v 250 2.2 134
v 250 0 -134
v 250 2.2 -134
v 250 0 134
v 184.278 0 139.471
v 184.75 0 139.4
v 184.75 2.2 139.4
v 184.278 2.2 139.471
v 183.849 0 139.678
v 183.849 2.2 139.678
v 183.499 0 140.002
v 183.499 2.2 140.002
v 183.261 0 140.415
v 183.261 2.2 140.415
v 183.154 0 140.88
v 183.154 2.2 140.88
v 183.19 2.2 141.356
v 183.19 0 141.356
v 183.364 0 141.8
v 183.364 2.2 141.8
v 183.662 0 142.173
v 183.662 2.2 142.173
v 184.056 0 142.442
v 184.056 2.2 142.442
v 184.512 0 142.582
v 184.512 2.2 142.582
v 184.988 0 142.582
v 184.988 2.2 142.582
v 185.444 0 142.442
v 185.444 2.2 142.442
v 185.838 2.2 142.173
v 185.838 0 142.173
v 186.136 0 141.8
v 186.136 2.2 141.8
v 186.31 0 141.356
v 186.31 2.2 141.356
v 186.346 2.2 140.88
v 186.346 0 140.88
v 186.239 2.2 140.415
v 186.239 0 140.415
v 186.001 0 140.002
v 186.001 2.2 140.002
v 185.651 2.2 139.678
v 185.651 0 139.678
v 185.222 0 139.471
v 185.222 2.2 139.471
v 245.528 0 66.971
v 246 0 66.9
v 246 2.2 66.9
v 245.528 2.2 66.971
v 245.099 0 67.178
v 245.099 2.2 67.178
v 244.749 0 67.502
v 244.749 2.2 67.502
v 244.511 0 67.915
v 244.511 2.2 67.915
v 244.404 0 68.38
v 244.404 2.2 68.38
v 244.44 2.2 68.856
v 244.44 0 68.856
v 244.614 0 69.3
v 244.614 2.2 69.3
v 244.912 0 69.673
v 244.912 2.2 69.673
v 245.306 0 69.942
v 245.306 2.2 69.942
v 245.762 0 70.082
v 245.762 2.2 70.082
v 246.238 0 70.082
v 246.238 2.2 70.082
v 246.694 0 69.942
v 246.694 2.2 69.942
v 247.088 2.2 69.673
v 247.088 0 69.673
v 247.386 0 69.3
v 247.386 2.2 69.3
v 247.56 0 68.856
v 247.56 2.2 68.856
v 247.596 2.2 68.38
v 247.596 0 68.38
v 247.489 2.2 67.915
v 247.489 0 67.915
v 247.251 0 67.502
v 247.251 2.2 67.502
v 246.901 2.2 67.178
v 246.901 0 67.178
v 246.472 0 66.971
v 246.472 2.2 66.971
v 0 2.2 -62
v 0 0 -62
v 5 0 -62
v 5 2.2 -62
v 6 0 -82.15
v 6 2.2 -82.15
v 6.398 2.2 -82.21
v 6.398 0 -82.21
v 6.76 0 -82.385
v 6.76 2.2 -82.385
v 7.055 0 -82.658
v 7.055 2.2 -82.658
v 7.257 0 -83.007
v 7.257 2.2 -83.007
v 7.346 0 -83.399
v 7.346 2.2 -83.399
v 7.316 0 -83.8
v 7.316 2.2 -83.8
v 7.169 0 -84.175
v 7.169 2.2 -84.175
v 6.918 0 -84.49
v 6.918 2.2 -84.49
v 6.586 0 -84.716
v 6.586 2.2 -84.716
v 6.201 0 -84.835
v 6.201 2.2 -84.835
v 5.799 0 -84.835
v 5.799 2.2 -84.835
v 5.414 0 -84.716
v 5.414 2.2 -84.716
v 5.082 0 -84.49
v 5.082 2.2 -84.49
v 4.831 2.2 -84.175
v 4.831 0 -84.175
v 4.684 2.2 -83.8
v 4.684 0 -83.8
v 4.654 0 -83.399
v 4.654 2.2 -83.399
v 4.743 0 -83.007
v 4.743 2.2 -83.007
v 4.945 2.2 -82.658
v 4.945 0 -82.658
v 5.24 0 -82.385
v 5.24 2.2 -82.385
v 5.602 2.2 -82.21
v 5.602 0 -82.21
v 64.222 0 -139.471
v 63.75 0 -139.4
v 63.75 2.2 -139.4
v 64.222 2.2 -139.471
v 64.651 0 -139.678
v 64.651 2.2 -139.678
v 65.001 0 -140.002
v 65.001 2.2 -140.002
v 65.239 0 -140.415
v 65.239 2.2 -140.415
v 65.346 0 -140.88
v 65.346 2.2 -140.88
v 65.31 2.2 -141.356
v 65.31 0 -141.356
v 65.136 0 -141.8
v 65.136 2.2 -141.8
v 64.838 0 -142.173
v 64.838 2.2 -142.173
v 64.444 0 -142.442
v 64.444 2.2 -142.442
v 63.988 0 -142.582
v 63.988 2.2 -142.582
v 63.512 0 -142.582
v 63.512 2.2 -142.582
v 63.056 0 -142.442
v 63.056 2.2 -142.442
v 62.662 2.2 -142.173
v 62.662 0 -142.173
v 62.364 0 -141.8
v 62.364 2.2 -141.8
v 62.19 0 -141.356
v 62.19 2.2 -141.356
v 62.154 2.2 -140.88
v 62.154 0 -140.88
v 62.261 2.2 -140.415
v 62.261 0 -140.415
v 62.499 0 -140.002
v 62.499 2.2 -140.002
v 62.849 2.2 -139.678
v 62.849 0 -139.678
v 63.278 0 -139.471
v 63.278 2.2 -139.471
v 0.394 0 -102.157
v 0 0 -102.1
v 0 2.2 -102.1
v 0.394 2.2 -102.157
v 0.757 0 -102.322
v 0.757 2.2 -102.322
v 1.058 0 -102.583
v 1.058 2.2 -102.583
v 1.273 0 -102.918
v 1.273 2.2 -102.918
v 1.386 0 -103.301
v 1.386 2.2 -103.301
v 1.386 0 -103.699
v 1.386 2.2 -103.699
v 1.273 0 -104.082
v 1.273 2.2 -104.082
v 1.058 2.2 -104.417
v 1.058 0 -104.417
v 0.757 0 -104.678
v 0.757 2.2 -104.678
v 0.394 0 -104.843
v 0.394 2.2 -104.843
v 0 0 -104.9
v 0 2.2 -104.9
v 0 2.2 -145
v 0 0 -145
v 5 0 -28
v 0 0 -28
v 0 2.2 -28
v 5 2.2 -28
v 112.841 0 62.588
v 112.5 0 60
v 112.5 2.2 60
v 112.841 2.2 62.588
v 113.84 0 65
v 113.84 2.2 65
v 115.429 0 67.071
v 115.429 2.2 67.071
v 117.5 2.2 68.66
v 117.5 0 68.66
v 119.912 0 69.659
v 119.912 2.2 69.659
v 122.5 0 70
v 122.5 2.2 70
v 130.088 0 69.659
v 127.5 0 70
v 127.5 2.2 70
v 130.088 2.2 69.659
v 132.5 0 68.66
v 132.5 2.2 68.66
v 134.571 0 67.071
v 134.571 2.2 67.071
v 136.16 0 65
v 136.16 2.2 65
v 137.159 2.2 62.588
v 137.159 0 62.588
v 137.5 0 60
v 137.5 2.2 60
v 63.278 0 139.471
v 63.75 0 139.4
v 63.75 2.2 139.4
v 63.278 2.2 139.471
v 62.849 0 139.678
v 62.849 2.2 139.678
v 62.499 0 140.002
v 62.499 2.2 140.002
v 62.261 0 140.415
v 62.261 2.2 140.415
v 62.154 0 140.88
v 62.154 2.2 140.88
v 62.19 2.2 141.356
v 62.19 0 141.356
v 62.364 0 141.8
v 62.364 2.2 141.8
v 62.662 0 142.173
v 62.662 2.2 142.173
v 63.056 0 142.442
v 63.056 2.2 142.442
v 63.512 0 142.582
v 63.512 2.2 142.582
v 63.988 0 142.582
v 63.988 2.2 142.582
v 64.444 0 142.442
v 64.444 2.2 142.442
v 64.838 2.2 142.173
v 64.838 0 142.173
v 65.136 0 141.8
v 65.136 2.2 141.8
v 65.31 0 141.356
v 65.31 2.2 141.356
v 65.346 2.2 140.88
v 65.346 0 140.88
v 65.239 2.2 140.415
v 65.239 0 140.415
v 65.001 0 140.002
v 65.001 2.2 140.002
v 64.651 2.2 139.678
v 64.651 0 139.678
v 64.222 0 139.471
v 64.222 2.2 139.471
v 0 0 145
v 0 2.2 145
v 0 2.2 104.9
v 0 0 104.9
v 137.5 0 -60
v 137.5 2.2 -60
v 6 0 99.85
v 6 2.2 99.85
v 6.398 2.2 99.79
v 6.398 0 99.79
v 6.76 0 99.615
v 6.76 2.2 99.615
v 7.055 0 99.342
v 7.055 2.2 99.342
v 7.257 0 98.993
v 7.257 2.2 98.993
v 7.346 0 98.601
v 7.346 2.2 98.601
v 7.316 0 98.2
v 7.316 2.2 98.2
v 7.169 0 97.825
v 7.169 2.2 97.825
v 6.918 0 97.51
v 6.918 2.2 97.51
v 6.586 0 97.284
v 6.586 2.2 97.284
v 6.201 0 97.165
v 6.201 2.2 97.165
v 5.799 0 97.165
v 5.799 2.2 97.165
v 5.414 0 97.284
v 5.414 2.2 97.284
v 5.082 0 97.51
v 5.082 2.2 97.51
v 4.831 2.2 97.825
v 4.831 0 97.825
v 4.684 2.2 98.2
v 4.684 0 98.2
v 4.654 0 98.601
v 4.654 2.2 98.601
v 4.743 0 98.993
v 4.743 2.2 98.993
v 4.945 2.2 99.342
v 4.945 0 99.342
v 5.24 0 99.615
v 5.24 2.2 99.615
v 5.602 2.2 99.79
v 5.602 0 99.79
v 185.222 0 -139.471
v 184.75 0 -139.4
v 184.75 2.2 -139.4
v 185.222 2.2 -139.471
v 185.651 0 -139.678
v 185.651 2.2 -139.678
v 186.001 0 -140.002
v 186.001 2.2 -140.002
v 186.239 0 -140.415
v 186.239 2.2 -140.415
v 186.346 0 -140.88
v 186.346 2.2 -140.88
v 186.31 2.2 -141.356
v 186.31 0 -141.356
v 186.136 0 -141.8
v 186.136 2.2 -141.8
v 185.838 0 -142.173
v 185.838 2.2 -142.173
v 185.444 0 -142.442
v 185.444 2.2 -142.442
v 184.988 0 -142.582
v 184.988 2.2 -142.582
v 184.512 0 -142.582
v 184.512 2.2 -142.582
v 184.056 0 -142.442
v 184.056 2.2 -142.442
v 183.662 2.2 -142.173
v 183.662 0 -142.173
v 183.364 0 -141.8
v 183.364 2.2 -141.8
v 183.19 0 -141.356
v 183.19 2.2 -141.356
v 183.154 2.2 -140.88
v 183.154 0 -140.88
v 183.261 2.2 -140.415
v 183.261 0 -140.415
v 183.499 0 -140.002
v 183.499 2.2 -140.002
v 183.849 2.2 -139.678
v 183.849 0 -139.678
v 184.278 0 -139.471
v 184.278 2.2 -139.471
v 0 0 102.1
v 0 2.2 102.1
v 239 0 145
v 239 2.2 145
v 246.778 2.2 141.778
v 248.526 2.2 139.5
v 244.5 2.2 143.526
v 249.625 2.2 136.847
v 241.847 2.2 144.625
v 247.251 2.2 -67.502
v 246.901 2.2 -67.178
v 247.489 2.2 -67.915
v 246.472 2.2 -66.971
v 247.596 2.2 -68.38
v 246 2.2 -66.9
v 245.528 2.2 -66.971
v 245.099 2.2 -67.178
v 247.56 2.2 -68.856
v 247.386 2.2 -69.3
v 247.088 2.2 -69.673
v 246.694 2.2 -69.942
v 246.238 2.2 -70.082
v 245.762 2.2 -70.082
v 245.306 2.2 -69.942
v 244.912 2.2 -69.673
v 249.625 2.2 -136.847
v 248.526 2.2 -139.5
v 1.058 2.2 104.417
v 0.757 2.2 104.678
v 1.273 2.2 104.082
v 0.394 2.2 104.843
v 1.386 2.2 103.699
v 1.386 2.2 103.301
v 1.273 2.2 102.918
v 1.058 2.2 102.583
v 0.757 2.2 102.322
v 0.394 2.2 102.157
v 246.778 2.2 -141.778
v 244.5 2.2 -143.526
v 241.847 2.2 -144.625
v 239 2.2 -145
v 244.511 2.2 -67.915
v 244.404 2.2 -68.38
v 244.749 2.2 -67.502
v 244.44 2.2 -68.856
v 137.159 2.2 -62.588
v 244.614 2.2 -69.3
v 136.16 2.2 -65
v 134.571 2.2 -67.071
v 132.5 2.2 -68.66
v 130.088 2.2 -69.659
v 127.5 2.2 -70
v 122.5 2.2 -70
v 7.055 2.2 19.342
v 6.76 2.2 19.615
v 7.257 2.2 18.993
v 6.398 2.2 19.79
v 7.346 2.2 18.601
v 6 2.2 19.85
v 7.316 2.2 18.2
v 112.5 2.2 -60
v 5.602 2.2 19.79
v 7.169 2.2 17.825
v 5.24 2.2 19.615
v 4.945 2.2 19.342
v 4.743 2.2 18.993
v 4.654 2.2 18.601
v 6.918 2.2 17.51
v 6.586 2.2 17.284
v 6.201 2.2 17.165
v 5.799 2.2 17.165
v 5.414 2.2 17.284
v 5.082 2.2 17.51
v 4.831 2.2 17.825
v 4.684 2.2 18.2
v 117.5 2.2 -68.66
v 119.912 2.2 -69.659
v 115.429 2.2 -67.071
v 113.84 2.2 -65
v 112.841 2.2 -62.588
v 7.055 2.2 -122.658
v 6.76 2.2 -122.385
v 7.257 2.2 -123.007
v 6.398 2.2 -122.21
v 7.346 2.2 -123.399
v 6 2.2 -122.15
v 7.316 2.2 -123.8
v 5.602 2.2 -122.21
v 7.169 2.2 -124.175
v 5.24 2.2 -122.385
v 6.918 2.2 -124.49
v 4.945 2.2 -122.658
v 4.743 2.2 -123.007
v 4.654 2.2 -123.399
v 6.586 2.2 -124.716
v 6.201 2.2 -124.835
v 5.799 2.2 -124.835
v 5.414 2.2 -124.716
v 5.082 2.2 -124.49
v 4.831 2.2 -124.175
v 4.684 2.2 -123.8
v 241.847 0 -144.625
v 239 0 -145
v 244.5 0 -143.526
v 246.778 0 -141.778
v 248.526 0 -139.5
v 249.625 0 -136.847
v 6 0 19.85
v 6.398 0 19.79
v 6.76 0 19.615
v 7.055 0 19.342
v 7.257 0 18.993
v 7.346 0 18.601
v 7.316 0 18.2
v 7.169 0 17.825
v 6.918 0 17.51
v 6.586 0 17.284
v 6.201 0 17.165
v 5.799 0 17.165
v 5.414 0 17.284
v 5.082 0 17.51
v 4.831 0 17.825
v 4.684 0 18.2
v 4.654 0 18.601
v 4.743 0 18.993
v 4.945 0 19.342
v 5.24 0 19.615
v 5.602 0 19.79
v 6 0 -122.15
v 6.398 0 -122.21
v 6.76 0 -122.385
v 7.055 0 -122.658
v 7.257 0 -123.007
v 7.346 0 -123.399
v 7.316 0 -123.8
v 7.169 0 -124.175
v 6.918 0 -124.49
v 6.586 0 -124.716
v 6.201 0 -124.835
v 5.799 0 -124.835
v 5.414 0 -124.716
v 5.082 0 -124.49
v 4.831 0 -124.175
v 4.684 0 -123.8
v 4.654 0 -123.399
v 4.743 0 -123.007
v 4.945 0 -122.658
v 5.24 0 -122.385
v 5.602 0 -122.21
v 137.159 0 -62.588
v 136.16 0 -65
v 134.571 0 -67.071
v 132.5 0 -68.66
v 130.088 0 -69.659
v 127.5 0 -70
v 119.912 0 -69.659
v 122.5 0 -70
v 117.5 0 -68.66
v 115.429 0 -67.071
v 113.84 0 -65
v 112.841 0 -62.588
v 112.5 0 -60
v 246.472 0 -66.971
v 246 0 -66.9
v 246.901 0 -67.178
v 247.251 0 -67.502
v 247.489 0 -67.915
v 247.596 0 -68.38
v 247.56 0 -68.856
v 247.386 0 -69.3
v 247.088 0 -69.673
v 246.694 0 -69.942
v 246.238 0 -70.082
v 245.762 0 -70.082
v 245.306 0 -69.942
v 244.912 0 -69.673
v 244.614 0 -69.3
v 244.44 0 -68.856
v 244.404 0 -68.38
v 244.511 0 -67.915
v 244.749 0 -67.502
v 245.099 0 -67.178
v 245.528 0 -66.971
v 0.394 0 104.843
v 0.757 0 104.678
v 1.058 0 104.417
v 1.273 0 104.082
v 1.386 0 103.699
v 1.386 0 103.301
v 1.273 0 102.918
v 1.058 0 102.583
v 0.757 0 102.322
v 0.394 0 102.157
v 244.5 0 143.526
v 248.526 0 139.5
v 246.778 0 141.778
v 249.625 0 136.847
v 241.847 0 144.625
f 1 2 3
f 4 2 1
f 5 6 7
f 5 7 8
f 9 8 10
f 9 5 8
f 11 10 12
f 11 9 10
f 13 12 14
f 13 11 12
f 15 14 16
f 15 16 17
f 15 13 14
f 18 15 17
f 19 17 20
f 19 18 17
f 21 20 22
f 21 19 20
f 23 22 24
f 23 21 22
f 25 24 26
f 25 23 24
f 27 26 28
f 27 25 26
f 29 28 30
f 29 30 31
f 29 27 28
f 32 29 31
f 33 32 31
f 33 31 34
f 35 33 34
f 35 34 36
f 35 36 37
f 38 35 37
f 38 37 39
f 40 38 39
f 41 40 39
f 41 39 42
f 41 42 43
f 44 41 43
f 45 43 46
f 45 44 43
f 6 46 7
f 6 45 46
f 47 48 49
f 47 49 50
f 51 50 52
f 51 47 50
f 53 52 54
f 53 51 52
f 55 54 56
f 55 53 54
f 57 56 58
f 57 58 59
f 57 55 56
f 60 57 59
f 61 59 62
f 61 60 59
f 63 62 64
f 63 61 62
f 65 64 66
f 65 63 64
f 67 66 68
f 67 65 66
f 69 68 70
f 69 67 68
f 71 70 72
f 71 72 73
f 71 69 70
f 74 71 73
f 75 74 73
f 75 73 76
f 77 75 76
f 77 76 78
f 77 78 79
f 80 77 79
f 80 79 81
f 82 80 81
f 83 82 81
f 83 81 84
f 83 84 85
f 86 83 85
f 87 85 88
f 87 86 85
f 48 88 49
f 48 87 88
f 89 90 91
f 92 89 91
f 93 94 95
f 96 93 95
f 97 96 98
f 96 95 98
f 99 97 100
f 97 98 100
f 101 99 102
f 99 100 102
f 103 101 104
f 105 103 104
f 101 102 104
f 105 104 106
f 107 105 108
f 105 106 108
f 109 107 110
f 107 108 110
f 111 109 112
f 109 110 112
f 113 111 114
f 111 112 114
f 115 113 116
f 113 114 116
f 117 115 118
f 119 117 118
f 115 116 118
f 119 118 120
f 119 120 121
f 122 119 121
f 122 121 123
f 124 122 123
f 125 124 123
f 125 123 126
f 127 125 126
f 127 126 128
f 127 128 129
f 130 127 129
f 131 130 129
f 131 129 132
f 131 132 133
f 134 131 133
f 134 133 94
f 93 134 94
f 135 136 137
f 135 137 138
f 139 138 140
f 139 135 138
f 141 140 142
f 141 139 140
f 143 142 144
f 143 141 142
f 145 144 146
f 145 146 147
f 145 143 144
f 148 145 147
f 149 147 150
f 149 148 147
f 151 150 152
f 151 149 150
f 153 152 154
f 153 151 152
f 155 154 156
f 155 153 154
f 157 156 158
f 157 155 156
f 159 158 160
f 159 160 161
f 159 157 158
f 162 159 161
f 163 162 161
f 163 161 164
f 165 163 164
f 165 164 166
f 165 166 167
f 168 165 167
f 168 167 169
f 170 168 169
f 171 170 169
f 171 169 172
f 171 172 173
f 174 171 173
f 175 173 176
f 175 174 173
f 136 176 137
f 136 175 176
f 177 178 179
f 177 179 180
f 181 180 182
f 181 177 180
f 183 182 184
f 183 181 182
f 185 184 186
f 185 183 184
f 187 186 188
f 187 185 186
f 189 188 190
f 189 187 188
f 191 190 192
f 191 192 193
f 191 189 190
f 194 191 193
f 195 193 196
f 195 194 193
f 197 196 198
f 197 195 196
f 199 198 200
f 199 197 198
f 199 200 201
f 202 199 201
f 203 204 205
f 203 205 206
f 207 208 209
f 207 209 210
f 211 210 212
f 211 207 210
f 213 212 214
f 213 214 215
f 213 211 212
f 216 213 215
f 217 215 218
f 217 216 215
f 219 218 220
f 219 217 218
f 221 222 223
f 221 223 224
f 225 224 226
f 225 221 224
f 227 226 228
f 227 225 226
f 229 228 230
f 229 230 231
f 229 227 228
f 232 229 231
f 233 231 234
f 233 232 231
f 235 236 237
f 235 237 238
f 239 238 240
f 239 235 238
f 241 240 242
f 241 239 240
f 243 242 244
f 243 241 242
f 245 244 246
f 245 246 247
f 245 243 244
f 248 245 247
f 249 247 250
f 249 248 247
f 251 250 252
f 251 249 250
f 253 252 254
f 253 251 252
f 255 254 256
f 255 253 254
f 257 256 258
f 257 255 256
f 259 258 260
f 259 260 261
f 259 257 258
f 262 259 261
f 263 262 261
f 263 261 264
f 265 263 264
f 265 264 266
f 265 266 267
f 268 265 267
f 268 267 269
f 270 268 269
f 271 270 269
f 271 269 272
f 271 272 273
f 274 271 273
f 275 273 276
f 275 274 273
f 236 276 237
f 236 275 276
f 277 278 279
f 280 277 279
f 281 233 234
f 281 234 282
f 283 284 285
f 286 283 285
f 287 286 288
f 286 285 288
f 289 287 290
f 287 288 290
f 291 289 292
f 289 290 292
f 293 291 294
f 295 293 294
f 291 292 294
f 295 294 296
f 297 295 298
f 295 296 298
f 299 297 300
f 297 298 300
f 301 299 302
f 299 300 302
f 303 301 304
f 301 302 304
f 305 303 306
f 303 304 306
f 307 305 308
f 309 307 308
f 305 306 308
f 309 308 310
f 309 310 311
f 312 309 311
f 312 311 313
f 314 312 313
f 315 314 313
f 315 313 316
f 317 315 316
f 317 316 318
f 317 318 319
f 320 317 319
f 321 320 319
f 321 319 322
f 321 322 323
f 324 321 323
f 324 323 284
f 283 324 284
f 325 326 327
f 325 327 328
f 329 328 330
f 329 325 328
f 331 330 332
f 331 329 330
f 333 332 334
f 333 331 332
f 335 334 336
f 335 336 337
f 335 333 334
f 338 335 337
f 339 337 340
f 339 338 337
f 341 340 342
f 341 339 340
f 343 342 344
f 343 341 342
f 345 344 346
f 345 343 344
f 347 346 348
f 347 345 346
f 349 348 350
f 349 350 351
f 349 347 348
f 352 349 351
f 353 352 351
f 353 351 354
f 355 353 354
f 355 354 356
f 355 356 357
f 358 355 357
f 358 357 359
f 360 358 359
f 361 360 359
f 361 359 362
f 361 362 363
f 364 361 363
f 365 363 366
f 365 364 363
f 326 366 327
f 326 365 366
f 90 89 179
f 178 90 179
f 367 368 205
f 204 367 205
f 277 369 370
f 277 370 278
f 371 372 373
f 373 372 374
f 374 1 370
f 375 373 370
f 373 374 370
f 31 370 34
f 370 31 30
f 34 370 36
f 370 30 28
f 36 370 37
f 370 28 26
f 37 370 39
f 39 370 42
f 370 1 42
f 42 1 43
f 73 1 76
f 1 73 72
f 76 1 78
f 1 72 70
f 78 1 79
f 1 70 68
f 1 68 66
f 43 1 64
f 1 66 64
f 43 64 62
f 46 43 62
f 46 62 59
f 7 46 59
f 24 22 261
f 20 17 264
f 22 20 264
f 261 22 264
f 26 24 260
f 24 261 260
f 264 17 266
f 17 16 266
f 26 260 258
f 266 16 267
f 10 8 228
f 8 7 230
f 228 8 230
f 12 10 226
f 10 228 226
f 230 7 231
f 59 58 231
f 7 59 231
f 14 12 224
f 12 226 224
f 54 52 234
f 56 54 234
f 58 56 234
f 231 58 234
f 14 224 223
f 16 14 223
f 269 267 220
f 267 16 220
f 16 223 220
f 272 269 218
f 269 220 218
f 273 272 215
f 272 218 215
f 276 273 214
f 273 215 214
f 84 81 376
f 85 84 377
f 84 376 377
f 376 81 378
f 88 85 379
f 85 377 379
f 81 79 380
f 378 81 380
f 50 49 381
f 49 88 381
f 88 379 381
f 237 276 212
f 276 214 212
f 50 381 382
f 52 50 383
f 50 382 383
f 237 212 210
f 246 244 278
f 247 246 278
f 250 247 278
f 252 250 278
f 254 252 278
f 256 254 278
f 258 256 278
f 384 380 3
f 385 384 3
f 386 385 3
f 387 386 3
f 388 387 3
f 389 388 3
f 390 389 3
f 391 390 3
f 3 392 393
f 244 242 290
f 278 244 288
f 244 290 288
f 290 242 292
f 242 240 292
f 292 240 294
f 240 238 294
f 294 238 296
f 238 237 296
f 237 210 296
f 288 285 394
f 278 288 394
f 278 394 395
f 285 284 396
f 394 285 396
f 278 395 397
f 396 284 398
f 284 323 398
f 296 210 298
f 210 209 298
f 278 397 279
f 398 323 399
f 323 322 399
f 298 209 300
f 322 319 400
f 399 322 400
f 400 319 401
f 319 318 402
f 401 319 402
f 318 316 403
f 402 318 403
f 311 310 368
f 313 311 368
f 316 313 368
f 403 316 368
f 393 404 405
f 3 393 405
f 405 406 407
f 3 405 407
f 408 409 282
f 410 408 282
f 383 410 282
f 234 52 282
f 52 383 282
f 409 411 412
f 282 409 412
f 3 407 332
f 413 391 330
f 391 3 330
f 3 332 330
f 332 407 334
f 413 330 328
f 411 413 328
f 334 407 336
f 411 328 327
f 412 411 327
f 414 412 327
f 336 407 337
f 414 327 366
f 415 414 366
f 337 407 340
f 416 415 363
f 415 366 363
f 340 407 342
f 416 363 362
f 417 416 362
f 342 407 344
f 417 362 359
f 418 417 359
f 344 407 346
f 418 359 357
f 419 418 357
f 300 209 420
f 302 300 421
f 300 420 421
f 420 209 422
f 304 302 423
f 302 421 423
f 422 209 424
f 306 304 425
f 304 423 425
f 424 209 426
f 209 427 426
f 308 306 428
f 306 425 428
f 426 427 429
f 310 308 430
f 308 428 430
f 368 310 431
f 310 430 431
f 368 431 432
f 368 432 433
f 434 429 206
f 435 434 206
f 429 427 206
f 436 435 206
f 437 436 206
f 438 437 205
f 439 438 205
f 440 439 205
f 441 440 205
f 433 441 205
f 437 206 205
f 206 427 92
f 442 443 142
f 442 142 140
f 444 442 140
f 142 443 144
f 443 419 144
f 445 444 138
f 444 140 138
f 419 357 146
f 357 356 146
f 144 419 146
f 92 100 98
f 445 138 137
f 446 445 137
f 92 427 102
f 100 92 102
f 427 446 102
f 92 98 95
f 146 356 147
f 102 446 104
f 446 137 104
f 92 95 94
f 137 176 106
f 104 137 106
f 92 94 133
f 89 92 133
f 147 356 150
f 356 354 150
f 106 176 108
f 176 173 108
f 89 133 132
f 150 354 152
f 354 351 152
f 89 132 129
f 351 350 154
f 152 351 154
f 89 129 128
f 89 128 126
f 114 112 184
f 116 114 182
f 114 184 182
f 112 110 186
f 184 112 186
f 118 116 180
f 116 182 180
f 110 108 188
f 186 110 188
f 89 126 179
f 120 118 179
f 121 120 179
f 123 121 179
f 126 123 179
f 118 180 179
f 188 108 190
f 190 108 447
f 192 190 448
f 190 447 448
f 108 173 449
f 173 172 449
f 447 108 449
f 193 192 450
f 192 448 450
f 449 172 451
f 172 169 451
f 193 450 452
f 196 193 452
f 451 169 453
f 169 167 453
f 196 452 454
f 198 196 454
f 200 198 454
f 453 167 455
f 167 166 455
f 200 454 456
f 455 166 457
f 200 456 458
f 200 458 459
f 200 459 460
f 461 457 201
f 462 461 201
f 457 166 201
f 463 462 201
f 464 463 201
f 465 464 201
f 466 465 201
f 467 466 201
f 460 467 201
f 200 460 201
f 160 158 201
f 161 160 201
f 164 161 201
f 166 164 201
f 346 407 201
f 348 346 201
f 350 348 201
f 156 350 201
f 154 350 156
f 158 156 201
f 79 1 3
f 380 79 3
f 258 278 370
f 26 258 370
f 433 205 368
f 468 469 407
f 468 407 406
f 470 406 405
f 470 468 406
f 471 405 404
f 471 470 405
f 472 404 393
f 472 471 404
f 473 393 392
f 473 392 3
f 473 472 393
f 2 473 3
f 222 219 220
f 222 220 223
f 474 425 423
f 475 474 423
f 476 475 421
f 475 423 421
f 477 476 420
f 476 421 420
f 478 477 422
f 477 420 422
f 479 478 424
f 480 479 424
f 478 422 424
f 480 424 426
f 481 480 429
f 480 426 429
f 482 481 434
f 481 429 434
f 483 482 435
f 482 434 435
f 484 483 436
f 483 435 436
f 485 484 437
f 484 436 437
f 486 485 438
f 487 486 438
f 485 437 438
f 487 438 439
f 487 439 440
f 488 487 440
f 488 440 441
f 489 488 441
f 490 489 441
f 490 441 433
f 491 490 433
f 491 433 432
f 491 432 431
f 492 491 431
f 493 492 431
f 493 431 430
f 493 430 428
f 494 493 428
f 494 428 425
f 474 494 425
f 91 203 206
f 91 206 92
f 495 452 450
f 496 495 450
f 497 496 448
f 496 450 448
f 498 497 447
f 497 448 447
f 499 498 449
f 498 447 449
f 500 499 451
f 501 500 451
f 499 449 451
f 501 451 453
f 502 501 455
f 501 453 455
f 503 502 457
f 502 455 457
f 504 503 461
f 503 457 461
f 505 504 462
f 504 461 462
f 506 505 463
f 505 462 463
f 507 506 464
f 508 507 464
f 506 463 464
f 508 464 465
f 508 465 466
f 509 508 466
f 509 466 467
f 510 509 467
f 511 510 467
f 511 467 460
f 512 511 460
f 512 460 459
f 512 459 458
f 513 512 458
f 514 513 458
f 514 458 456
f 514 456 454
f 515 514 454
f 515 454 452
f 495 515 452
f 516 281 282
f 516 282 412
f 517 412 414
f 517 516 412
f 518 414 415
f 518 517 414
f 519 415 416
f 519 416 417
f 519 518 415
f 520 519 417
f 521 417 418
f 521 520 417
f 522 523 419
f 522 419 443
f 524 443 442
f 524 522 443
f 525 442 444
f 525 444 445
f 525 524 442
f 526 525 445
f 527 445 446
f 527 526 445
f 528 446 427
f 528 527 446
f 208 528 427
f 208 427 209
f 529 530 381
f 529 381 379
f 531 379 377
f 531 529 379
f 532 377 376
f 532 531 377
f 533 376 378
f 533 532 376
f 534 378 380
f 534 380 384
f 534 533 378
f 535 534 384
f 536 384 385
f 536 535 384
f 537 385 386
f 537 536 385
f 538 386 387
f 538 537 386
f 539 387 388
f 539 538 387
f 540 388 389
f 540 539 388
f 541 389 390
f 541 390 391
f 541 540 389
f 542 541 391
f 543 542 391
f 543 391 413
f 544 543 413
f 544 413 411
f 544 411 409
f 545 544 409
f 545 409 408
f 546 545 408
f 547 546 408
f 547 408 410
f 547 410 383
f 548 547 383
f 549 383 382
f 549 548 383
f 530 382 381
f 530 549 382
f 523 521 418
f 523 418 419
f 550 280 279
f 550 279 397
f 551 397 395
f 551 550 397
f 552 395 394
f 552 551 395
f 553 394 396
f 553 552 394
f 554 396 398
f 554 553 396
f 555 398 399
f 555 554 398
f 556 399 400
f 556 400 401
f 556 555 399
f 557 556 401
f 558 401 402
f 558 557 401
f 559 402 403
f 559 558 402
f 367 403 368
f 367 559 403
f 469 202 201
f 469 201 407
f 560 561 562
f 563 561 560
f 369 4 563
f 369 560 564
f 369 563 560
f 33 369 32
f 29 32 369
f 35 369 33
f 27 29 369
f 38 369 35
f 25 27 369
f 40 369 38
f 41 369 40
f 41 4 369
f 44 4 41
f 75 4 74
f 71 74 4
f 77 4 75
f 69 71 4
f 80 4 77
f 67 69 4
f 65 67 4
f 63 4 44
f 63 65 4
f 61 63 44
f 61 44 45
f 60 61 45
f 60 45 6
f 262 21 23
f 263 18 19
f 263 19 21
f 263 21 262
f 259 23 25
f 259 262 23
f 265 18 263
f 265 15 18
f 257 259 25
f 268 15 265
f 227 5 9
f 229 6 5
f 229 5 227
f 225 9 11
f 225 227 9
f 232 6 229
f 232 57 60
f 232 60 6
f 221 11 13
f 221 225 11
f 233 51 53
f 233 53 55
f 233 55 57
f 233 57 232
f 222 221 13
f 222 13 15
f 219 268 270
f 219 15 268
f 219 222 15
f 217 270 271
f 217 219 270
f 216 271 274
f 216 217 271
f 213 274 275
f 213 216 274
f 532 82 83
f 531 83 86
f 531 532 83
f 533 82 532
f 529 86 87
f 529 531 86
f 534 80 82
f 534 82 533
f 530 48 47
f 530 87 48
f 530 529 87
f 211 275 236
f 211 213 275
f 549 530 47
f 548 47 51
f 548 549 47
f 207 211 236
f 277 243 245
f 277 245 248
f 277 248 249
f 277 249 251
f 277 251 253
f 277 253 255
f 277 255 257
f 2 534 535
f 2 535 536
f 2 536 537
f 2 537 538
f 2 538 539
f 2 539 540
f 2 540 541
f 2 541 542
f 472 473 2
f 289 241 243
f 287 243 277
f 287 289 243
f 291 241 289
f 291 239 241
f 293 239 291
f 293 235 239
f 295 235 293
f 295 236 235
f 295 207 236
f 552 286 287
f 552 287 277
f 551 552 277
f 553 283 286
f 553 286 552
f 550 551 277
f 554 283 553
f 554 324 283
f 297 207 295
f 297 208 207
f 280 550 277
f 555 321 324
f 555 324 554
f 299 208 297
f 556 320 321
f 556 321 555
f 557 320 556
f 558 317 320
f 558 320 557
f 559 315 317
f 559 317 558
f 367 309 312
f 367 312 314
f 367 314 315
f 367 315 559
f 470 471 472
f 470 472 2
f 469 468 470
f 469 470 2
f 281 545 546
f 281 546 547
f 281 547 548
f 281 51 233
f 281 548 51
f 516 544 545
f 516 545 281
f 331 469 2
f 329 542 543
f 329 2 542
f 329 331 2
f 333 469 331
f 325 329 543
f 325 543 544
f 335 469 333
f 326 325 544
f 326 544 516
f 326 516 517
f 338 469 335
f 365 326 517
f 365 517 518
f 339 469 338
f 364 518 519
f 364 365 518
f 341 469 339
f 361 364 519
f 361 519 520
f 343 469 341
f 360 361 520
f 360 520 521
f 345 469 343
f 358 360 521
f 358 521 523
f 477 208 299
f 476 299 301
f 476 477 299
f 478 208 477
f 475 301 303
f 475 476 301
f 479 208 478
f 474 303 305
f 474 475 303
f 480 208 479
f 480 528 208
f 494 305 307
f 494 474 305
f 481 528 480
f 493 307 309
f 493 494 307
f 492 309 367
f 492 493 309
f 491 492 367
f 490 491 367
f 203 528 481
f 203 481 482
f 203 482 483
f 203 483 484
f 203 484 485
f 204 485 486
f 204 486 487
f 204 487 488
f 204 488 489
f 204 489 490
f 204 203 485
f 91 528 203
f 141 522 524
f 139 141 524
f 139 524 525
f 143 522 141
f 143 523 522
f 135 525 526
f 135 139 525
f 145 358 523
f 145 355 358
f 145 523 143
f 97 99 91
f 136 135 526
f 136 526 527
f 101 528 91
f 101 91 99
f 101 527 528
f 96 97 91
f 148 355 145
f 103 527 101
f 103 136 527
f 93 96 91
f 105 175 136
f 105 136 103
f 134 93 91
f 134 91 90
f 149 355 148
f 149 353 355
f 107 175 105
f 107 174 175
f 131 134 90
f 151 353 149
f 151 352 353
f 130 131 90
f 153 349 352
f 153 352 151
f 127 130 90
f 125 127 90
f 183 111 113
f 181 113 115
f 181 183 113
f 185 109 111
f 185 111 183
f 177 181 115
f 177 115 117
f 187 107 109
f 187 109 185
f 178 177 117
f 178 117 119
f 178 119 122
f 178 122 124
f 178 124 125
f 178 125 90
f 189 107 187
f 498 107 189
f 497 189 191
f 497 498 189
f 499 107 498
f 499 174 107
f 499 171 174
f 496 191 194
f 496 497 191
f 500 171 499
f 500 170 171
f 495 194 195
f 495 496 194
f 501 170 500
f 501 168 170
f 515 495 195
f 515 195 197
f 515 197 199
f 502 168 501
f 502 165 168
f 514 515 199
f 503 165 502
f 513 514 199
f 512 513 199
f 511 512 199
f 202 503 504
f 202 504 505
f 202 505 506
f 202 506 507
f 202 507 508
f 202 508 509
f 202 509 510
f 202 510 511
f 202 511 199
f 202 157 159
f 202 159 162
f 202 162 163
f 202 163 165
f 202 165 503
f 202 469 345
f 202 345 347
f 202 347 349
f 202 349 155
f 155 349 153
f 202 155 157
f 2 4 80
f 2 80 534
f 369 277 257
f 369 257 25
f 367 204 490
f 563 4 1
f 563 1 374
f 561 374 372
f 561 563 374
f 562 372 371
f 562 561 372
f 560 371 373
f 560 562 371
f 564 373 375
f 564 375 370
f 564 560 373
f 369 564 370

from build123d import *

# Parameters (mm, degrees)
SKETCH1_R           = 1.6
SKETCH1_R_2         = 1.4
SKETCH1_W           = 10
SKETCH1_H           = 34
BOSS_EXTRUDE1_DEPTH = 2.2
SKETCH2_R           = 1.35
CUT_EXTRUDE1_DEPTH  = 59.2
SKETCH4_W           = 292.714783979
SKETCH4_H           = 326.007375252
CUT_EXTRUDE2_DEPTH  = 2.2


with BuildPart() as part:
    # Sketch1 → Boss-Extrude1 (new body)
    with BuildSketch(Plane(origin=(0, 0, 0), x_dir=(1, 0, 0), z_dir=(0, 1, 0))):
        with BuildLine():
            Line((-239, 145), (239, 145))
            ThreePointArc((239, 145), (246.778174593, 141.778174593), (250, 134))
            Line((250, 134), (250, -134))
            ThreePointArc((250, -134), (246.778174593, -141.778174593), (239, -145))
            Line((239, -145), (-239, -145))
            ThreePointArc((-239, -145), (-246.778174593, -141.778174593), (-250, -134))
            Line((-250, -134), (-250, 134))
            ThreePointArc((-250, 134), (-246.778174593, 141.778174593), (-239, 145))
        make_face()
        with Locations(Location((63.75, 141, 0), (0, 0, 270))):
            Circle(SKETCH1_R, mode=Mode.SUBTRACT)
        with Locations(Location((184.75, 141, 0), (0, 0, 270))):
            Circle(SKETCH1_R, mode=Mode.SUBTRACT)
        with Locations(Location((246, 68.5, 0), (0, 0, 270))):
            Circle(SKETCH1_R, mode=Mode.SUBTRACT)
        with Locations(Location((0, 103.5, 0), (0, 0, 270))):
            Circle(SKETCH1_R_2, mode=Mode.SUBTRACT)
        with Locations(Location((0, -103.5, 0), (0, 0, 270))):
            Circle(SKETCH1_R_2, mode=Mode.SUBTRACT)
        with Locations(Location((-246, 68.5, 0), (0, 0, 90))):
            Circle(SKETCH1_R, mode=Mode.SUBTRACT)
        with Locations(Location((-184.75, 141, 0), (0, 0, 90))):
            Circle(SKETCH1_R, mode=Mode.SUBTRACT)
        with Locations(Location((-63.75, 141, 0), (0, 0, 90))):
            Circle(SKETCH1_R, mode=Mode.SUBTRACT)
        with Locations(Location((184.75, -141, 0), (0, 0, 90))):
            Circle(SKETCH1_R, mode=Mode.SUBTRACT)
        with Locations(Location((246, -68.5, 0), (0, 0, 90))):
            Circle(SKETCH1_R, mode=Mode.SUBTRACT)
        with Locations(Location((63.75, -141, 0), (0, 0, 90))):
            Circle(SKETCH1_R, mode=Mode.SUBTRACT)
        with Locations(Location((-63.75, -141, 0), (0, 0, 270))):
            Circle(SKETCH1_R, mode=Mode.SUBTRACT)
        with Locations(Location((-184.75, -141, 0), (0, 0, 270))):
            Circle(SKETCH1_R, mode=Mode.SUBTRACT)
        with Locations(Location((-246, -68.5, 0), (0, 0, 270))):
            Circle(SKETCH1_R, mode=Mode.SUBTRACT)
        with BuildLine():
            Line((-127.5, -70), (-122.5, -70))
            ThreePointArc((-122.5, -70), (-115.428932188, -67.071067812), (-112.5, -60))
            Line((-112.5, -60), (-112.5, 60))
            ThreePointArc((-112.5, 60), (-115.428932188, 67.071067812), (-122.5, 70))
            Line((-122.5, 70), (-127.5, 70))
            ThreePointArc((-127.5, 70), (-134.571067812, 67.071067812), (-137.5, 60))
            Line((-137.5, 60), (-137.5, -60))
            ThreePointArc((-137.5, -60), (-134.571067812, -67.071067812), (-127.5, -70))
        make_face(mode=Mode.SUBTRACT)
        with BuildLine():
            Line((122.5, -70), (127.5, -70))
            ThreePointArc((127.5, -70), (134.571067812, -67.071067812), (137.5, -60))
            Line((137.5, -60), (137.5, 60))
            ThreePointArc((137.5, 60), (134.571067812, 67.071067812), (127.5, 70))
            Line((127.5, 70), (122.5, 70))
            ThreePointArc((122.5, 70), (115.428932188, 67.071067812), (112.5, 60))
            Line((112.5, 60), (112.5, -60))
            ThreePointArc((112.5, -60), (115.428932188, -67.071067812), (122.5, -70))
        make_face(mode=Mode.SUBTRACT)
        with Locations((0, 45)):
            Rectangle(SKETCH1_W, SKETCH1_H, mode=Mode.SUBTRACT)
    extrude(amount=BOSS_EXTRUDE1_DEPTH)

    # Sketch2 → Cut-Extrude1 (cut)
    with BuildSketch(Plane(origin=(0, 2.2, 0), x_dir=(1, 0, 0), z_dir=(0, 1, 0))):
        with Locations(Location((-6, -18.5, 0), (0, 0, 270))):
            Circle(SKETCH2_R)
        with Locations(Location((6, -18.5, 0), (0, 0, 270))):
            Circle(SKETCH2_R)
        with Locations(Location((-6, -98.5, 0), (0, 0, 270))):
            Circle(SKETCH2_R)
        with Locations(Location((6, -98.5, 0), (0, 0, 270))):
            Circle(SKETCH2_R)
        with Locations(Location((-6, 123.5, 0), (0, 0, 270))):
            Circle(SKETCH2_R)
        with Locations(Location((6, 123.5, 0), (0, 0, 270))):
            Circle(SKETCH2_R)
        with Locations(Location((-6, 83.5, 0), (0, 0, 270))):
            Circle(SKETCH2_R)
        with Locations(Location((6, 83.5, 0), (0, 0, 270))):
            Circle(SKETCH2_R)
    extrude(amount=-CUT_EXTRUDE1_DEPTH, mode=Mode.SUBTRACT)

    # Sketch4 → Cut-Extrude2 (cut)
    with BuildSketch(Plane(origin=(0, 2.2, 0), x_dir=(1, 0, 0), z_dir=(0, 1, 0))):
        with Locations((-146.35739199, -18.003687626)):
            Rectangle(SKETCH4_W, SKETCH4_H)
    extrude(amount=-CUT_EXTRUDE2_DEPTH, mode=Mode.SUBTRACT)


solid = part.part
